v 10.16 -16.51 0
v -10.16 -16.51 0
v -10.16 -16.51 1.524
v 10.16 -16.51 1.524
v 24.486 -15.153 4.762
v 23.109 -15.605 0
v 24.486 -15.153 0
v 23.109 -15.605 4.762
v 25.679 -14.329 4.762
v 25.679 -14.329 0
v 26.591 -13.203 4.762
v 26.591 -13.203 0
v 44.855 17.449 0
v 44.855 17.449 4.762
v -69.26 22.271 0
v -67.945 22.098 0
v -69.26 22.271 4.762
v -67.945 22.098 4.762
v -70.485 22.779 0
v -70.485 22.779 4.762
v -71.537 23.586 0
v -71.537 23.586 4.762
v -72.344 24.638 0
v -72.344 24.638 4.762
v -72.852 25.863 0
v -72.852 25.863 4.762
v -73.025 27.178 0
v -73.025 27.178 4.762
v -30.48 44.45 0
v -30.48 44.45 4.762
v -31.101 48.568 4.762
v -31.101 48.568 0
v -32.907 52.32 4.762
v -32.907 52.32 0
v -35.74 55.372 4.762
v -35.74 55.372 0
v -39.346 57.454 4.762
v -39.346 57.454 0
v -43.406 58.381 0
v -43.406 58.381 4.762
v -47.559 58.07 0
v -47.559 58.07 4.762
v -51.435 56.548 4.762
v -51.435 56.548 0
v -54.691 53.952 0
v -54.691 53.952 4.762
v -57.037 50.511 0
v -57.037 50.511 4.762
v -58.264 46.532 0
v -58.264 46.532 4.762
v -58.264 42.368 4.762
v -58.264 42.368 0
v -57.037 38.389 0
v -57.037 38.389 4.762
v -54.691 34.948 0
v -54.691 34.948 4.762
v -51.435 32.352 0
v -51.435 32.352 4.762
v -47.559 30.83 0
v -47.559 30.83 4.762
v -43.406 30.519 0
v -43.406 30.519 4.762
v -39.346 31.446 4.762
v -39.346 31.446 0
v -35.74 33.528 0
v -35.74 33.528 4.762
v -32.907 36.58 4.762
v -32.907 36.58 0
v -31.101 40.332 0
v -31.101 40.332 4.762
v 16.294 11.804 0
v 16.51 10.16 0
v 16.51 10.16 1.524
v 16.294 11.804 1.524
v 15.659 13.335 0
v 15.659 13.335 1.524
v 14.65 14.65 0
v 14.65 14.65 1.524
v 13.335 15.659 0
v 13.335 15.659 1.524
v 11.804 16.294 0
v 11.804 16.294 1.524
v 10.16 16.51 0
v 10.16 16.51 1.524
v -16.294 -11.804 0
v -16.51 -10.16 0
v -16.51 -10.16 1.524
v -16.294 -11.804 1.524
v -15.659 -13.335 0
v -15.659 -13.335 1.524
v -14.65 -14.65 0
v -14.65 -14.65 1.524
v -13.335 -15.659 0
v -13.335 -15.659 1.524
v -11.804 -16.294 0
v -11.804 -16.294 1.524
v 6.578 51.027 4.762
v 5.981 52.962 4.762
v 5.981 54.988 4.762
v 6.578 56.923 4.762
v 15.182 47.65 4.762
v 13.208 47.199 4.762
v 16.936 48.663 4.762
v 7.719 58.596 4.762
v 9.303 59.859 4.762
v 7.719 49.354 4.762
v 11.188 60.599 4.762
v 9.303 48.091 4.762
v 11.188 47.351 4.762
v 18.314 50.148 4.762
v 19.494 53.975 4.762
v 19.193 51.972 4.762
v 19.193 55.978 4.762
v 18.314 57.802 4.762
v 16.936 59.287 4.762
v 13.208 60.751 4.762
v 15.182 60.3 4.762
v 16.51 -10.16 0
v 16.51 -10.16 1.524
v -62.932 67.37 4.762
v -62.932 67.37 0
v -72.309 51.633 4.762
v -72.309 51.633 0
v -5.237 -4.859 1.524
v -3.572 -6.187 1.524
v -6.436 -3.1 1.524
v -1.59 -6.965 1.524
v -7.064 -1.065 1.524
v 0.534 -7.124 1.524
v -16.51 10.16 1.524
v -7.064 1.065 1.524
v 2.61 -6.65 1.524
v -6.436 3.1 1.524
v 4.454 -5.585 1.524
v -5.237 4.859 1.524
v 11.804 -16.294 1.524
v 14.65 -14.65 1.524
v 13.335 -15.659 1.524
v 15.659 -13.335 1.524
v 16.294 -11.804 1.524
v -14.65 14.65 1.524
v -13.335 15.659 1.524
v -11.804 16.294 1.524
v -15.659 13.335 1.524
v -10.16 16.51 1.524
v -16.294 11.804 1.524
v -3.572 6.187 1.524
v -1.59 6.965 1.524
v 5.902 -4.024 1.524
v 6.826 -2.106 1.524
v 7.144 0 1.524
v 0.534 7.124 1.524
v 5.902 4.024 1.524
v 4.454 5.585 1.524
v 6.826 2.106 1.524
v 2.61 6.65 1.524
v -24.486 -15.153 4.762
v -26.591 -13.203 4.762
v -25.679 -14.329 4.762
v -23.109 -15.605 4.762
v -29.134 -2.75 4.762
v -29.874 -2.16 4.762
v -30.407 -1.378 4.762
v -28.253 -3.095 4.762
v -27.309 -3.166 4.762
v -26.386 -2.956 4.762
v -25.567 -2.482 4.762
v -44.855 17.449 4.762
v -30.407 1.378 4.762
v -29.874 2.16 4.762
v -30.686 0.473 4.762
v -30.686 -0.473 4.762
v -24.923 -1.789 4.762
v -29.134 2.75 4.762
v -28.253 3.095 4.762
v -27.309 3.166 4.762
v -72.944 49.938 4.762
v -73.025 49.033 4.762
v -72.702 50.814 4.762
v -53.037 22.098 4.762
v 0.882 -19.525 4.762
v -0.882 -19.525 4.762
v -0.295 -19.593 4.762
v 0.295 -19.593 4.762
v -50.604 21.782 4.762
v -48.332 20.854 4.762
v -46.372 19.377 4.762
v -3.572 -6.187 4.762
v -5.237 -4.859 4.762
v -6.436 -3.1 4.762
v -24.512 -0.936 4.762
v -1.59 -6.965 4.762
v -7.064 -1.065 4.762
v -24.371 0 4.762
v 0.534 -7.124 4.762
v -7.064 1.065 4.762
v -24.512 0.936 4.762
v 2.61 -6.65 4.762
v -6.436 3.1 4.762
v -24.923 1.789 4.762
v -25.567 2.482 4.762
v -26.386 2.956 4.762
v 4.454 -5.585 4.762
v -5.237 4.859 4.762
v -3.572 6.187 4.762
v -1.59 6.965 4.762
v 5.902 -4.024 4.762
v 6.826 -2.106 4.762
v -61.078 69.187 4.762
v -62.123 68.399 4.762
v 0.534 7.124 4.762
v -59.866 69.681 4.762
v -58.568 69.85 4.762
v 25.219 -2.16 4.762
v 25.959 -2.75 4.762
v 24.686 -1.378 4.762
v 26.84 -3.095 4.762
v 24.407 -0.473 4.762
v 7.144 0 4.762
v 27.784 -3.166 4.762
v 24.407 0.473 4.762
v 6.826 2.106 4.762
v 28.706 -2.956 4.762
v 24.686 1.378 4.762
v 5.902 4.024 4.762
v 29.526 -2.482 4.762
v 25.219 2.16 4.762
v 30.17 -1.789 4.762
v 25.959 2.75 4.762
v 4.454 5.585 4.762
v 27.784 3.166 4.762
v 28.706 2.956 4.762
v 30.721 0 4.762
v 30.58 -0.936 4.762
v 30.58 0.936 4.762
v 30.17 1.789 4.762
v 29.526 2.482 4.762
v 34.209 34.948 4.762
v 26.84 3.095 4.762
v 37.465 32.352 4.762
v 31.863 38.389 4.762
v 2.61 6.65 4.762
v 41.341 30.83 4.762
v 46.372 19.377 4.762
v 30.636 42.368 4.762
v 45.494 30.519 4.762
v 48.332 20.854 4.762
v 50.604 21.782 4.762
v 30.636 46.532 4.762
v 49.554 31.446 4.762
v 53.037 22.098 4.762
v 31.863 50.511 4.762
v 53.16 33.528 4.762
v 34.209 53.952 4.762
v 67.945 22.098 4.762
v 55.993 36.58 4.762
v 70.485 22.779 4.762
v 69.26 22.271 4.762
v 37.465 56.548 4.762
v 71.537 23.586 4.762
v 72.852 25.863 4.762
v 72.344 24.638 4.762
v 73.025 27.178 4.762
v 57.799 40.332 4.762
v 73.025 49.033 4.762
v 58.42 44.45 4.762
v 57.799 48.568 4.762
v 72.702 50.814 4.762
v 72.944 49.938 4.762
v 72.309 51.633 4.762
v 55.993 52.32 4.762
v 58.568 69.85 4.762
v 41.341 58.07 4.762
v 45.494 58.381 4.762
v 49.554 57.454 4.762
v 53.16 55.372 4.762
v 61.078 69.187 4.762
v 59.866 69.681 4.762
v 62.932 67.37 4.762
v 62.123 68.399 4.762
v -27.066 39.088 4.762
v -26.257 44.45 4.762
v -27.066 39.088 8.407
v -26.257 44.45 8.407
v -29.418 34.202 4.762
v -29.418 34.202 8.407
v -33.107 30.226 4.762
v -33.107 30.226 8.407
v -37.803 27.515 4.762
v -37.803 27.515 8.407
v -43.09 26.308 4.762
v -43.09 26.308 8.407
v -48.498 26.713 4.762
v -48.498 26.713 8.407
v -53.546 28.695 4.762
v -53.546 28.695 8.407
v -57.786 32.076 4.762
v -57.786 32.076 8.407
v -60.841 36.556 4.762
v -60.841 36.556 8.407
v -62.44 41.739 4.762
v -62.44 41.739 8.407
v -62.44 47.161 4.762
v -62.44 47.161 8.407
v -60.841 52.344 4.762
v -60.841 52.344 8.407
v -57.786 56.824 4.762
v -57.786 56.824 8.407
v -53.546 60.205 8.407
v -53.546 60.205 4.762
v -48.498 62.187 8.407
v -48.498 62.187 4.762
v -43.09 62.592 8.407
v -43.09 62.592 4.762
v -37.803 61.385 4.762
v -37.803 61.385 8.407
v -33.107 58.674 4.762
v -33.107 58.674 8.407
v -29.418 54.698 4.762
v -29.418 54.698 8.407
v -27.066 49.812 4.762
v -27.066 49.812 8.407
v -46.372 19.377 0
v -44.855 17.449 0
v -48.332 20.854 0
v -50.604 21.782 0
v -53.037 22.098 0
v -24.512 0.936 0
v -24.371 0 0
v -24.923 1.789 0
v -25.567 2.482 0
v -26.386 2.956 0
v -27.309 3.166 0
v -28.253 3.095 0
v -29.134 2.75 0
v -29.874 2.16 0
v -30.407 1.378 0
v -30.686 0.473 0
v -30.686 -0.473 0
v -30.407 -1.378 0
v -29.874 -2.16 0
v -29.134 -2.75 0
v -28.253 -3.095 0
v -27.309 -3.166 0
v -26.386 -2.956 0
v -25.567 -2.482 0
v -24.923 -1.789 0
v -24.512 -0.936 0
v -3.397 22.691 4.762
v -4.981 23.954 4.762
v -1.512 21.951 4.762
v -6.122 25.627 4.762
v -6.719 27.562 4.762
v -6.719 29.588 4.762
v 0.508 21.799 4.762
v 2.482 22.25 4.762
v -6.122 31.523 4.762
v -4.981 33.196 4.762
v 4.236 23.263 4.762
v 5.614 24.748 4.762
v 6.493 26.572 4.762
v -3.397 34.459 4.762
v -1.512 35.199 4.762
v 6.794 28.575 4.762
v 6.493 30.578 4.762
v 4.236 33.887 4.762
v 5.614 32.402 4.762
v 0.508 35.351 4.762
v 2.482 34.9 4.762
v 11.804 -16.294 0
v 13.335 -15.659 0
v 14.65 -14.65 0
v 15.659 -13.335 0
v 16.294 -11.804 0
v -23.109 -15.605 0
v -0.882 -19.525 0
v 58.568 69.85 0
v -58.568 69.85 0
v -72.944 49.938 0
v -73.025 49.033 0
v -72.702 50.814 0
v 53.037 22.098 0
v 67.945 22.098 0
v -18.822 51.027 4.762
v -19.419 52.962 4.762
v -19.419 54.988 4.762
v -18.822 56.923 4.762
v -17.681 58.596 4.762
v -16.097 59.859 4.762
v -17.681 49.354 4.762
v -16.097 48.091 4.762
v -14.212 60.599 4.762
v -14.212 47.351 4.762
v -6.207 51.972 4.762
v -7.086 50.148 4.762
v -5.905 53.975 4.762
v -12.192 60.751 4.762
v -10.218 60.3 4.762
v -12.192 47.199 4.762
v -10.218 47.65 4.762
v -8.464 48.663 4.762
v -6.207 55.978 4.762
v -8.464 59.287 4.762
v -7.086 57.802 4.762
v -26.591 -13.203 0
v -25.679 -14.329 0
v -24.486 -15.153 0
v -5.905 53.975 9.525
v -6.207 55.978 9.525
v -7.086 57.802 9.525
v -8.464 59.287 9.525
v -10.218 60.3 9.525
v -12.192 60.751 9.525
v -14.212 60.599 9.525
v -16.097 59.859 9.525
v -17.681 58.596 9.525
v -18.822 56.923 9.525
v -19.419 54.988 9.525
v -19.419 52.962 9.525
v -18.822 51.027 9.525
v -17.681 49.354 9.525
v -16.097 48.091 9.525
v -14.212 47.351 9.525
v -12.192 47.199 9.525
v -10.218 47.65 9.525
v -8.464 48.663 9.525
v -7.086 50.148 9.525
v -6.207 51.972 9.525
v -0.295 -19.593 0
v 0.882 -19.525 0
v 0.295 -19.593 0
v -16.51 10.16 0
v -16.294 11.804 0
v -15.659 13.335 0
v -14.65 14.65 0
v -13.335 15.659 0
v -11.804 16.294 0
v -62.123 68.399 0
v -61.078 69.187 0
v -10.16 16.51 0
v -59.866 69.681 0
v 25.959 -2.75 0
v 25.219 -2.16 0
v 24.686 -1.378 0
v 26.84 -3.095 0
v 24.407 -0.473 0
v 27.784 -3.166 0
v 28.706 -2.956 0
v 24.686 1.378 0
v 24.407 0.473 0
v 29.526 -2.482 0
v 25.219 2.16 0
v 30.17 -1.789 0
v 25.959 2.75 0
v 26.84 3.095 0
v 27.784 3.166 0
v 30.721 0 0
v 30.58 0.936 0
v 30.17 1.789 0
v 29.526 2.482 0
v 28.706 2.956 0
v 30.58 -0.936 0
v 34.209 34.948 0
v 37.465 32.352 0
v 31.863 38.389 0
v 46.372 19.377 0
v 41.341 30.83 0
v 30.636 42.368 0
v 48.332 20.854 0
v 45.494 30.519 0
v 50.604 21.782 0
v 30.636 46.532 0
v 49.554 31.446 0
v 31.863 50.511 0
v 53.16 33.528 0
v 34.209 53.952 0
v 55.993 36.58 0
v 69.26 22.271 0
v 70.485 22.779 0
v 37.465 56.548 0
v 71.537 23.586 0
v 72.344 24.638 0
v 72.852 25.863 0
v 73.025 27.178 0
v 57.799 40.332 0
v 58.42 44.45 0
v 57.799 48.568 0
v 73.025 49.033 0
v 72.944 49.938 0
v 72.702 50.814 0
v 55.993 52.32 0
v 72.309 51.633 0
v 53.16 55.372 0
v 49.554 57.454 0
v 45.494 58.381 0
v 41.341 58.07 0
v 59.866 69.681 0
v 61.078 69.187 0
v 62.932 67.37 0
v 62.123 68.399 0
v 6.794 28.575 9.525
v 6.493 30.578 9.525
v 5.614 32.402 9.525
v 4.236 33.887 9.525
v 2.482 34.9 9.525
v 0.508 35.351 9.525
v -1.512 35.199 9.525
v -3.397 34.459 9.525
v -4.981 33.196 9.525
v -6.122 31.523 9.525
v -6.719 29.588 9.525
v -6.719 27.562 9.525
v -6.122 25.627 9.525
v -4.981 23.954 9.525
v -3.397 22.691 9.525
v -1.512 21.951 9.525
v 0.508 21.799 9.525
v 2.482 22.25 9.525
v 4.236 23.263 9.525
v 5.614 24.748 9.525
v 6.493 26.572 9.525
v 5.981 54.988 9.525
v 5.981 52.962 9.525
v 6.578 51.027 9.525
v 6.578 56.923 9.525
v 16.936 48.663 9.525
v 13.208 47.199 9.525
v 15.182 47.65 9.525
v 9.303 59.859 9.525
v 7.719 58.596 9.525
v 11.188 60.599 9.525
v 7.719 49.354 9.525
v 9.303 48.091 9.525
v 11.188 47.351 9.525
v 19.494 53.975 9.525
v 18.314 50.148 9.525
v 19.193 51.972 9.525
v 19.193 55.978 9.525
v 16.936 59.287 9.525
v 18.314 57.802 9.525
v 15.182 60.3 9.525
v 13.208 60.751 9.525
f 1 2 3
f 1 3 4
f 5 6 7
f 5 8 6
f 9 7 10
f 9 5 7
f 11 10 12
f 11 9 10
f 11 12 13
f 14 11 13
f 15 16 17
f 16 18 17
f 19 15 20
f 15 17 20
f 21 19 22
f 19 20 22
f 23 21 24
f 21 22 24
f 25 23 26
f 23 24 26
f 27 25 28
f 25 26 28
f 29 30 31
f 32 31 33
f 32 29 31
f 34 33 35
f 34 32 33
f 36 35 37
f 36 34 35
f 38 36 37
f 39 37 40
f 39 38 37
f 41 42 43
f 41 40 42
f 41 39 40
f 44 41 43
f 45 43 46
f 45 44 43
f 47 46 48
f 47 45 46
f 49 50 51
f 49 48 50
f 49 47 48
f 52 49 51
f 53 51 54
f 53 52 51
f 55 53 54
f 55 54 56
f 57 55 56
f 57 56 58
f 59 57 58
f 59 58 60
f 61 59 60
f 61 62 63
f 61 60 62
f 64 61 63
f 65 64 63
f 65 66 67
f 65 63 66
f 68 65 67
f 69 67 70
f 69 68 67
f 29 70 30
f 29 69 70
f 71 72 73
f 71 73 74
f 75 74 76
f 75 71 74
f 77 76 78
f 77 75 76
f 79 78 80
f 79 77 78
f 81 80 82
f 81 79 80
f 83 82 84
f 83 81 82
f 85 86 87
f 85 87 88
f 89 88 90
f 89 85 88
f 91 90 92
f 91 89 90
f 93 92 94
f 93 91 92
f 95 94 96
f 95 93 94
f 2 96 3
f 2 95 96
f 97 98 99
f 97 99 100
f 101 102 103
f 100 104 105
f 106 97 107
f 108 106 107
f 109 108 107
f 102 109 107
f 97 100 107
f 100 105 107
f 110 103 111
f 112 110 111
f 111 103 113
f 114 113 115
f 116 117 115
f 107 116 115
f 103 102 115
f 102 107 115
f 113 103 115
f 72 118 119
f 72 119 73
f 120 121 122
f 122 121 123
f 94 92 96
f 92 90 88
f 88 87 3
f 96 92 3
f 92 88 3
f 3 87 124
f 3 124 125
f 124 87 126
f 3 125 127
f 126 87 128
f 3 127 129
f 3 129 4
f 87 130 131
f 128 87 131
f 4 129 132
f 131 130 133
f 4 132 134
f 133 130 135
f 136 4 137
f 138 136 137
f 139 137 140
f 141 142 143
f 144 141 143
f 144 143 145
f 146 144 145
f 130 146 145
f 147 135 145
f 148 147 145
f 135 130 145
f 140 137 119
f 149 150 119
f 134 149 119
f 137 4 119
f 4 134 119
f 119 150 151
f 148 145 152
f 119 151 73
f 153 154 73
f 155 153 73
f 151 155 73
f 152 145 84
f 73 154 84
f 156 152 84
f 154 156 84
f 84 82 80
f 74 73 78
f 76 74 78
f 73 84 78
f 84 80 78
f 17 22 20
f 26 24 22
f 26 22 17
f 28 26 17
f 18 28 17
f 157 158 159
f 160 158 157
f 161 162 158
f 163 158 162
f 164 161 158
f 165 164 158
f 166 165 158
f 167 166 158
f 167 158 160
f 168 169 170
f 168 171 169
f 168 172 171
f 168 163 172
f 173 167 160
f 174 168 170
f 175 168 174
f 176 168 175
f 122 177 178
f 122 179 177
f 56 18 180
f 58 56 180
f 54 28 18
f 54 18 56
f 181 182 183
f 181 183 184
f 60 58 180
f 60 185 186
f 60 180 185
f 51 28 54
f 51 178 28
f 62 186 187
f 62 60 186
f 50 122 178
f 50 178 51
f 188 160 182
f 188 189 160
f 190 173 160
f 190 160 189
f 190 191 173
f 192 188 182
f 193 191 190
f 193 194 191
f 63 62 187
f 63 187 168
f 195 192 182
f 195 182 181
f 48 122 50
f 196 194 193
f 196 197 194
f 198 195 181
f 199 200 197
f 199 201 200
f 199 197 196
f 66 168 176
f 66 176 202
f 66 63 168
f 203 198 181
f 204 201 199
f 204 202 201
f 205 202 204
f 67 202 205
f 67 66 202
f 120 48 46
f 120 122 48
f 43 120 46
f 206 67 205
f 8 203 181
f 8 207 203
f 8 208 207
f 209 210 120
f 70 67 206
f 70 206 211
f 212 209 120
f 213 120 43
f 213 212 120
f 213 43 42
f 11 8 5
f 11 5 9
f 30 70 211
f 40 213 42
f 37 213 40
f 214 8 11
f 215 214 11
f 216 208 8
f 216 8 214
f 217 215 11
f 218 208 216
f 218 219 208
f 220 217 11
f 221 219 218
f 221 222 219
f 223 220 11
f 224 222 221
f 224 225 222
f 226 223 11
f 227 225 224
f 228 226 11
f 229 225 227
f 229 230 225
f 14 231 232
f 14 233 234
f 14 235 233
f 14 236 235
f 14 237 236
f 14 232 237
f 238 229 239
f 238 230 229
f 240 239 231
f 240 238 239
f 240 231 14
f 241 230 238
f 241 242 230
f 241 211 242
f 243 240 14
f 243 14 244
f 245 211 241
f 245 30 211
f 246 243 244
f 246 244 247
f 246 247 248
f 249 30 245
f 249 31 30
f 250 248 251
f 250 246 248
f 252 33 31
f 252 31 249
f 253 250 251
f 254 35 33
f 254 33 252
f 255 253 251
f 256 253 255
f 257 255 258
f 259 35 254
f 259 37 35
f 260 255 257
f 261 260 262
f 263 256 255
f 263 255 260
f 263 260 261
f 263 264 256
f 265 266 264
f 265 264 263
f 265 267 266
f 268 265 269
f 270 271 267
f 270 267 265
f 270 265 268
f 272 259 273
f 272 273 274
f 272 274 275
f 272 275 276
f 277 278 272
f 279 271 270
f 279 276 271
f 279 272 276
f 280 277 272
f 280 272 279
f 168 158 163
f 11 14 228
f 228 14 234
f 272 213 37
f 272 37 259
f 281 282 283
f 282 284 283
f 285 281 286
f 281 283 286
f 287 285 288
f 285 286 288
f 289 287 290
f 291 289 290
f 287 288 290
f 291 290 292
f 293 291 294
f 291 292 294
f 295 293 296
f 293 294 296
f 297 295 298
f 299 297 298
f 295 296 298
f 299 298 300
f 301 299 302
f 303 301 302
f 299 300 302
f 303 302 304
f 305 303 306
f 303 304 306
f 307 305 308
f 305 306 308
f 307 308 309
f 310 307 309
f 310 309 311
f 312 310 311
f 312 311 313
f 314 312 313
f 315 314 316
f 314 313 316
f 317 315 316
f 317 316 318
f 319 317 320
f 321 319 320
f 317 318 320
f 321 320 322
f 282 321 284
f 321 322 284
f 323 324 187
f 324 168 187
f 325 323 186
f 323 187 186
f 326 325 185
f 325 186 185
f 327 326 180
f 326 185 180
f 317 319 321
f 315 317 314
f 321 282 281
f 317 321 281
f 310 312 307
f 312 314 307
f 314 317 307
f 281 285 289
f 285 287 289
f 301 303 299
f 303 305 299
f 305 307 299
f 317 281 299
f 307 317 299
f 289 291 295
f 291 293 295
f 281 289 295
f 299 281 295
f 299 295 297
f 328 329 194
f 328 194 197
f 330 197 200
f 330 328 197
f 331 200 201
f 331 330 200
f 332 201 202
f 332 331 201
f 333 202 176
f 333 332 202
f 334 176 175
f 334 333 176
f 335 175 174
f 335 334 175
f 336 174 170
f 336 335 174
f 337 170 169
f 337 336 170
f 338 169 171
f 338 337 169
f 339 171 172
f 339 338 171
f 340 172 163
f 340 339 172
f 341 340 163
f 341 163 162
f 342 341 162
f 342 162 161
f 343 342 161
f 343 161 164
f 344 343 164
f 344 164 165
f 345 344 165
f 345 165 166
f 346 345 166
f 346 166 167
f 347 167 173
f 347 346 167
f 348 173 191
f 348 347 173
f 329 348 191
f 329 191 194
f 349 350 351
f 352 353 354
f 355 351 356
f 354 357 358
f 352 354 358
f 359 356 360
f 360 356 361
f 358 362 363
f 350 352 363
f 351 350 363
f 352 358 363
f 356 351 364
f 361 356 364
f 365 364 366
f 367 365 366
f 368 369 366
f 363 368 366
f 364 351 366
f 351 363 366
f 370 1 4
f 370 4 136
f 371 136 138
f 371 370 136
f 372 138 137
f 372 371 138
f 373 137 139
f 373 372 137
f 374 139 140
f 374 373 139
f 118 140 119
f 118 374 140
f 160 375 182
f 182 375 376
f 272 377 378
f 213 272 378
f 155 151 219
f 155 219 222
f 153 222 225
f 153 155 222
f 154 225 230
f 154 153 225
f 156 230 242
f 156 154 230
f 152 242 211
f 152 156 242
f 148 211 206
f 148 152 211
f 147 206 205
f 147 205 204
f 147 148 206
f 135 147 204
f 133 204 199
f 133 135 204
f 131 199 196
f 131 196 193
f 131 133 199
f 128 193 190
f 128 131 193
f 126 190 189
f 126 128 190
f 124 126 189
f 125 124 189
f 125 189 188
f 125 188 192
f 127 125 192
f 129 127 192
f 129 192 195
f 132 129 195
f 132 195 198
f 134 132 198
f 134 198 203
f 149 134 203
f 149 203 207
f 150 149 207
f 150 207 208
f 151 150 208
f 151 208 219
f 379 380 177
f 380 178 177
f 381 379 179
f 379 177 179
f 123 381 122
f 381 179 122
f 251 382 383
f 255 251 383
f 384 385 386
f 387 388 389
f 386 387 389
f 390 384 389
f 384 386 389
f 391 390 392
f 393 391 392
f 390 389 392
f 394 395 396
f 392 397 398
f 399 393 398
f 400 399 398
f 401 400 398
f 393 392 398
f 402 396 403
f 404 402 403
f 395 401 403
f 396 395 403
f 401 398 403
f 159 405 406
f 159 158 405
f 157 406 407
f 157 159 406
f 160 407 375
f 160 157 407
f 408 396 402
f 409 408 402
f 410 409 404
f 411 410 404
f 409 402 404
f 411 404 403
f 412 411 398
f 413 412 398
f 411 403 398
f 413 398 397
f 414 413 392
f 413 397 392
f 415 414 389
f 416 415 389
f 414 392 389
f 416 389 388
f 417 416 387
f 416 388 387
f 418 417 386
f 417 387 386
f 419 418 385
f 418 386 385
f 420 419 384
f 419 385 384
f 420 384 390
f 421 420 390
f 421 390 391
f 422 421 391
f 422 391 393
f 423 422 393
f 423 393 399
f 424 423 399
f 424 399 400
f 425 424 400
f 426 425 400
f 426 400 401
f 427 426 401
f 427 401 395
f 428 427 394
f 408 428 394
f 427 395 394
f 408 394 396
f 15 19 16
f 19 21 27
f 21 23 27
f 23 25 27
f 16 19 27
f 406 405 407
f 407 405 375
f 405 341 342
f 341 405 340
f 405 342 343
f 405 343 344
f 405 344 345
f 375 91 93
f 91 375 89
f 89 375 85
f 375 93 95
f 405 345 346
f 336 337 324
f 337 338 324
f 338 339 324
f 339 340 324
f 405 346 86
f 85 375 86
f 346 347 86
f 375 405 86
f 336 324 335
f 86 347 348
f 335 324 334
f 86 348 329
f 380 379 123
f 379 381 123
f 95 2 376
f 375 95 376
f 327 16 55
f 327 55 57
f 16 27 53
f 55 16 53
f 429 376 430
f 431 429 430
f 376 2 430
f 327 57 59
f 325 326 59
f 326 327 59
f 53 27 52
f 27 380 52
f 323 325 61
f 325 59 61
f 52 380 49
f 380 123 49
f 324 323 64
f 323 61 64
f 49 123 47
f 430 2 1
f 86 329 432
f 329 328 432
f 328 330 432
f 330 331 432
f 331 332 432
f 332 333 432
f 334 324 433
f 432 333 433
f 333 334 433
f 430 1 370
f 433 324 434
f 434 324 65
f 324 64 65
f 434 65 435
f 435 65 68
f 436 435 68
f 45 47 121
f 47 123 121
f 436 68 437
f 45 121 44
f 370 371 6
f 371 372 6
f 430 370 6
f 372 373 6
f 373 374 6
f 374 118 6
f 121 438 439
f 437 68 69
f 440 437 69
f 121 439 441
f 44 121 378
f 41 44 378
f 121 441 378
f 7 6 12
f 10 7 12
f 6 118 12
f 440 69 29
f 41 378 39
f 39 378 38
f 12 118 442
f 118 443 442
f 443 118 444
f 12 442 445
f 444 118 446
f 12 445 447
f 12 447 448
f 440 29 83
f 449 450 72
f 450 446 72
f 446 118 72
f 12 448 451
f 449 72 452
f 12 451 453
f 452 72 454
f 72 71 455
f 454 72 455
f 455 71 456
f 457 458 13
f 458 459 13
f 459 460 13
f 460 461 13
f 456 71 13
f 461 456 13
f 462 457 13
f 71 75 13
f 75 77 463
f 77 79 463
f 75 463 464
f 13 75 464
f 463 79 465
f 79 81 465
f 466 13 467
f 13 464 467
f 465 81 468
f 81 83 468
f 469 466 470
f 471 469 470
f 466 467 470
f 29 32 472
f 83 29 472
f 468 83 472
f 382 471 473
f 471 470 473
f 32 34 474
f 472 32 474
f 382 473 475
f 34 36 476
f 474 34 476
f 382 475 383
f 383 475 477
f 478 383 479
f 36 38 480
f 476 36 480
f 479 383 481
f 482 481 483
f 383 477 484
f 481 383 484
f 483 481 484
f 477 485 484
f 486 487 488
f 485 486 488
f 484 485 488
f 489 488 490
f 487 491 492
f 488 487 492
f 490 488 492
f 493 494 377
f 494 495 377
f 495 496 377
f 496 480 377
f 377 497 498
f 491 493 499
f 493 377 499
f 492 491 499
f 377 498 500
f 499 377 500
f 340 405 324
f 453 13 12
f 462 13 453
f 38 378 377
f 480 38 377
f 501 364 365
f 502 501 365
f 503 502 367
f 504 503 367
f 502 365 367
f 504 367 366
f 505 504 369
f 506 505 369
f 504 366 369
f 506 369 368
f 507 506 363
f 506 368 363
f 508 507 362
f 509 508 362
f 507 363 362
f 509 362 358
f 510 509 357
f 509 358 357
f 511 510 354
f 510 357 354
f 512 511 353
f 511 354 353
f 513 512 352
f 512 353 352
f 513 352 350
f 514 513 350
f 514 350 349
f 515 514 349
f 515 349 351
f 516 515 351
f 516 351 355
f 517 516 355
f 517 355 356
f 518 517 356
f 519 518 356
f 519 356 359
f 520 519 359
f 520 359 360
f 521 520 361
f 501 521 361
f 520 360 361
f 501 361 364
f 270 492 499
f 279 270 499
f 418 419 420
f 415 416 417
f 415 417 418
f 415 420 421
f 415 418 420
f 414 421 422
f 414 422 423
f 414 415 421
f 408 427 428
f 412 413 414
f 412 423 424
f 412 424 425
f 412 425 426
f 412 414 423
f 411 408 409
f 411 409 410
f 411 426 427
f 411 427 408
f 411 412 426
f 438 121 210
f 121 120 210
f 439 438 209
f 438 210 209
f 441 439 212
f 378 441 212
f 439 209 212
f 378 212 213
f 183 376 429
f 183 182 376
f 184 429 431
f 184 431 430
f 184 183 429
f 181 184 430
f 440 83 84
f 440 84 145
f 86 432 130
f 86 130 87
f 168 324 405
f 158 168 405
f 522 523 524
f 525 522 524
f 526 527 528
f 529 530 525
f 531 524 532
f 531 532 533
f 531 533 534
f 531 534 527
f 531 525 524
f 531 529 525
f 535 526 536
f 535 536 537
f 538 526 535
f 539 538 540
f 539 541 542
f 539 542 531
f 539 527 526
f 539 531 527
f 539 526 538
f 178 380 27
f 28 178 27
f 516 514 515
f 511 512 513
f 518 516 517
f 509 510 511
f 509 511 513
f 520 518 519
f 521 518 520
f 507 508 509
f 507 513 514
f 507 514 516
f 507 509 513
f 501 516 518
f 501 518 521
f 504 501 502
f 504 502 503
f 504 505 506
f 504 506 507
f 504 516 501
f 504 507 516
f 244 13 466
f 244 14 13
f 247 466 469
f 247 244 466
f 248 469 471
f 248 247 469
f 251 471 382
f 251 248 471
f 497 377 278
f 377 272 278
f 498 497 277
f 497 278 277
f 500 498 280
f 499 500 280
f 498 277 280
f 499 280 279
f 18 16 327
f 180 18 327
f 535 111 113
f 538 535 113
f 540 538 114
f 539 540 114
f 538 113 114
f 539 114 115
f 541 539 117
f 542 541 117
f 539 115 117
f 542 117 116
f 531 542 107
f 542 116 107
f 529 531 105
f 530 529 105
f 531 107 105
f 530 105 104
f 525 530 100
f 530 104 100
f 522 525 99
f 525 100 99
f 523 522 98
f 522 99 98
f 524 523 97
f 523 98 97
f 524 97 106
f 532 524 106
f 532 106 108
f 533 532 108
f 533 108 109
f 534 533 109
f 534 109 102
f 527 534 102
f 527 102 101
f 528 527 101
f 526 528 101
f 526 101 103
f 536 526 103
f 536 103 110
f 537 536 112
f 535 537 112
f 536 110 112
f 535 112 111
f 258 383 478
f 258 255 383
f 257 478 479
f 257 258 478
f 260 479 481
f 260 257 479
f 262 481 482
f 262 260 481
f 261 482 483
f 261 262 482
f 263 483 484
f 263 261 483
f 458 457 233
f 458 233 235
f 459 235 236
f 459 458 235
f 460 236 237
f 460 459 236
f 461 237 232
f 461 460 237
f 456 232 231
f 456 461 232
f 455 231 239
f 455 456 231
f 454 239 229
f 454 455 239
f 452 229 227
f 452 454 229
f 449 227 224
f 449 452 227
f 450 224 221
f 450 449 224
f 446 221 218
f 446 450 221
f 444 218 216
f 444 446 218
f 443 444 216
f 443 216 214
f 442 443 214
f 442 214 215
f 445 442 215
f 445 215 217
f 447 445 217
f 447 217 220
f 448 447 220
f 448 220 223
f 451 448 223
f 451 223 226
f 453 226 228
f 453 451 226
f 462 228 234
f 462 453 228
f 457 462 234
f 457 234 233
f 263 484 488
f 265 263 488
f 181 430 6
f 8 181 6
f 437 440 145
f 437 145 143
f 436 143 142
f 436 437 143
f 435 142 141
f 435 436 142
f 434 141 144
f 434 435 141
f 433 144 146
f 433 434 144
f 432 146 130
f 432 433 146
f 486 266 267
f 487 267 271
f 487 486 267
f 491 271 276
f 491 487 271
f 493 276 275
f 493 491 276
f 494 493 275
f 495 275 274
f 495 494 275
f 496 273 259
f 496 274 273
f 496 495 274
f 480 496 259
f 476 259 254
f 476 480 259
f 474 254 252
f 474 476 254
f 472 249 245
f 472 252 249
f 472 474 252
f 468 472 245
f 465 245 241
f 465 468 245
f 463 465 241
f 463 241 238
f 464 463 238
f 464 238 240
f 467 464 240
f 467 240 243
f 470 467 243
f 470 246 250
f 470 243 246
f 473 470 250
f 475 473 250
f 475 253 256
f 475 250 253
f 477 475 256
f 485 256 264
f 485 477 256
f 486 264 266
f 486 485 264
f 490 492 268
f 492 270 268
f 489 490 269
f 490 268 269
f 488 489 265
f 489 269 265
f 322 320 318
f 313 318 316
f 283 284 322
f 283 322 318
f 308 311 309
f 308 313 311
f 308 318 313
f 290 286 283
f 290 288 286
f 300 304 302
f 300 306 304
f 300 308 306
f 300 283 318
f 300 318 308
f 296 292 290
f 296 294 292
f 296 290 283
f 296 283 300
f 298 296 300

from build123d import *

# Parameters (mm, degrees)
F0_R      = 3.175
F0_R_2    = 7.14375
F1_DEPTH  = 4.7625
F2_R      = 9.525
F3_R      = 5.08
F4_R      = 13.97
F5_DEPTH  = 25.4
F7_DEPTH  = 1.524
F10_W     = 18.19275
F10_H     = 3.6449
F12_R     = 6.7945
F13_DEPTH = 4.7625


with BuildPart() as f1:
    # F0 (on Top) → F1 (new body)
    with BuildSketch(Plane.XY):
        Polygon((-47.625, 22.098), (-25.4, -15.201417), (0, -19.680122), (25.4, -15.201417), (47.625, 22.098), (73.025, 22.098), (73.025, 50.431723), (61.454545, 69.85), (0, 69.85), (-61.454545, 69.85), (-73.025, 50.431723), (-73.025, 22.098), align=None)
        with Locations((-27.5463, 0)):
            Circle(F0_R, mode=Mode.SUBTRACT)
        Circle(F0_R_2, mode=Mode.SUBTRACT)
        with Locations((27.5463, 0)):
            Circle(F0_R, mode=Mode.SUBTRACT)
    extrude(amount=F1_DEPTH)

    # F2
    f2_edges = [f1.edges().sort_by_distance(p)[0] for p in [
        (-47.625, 22.098, 2.38125),
        (47.625, 22.098, 2.38125),
    ]]
    fillet(f2_edges, radius=F2_R)

    # F3
    f3_edges = [f1.edges().sort_by_distance(p)[0] for p in [
        (-73.025, 22.098, 2.38125),
        (-25.4, -15.201417, 2.38125),
        (0, -19.680122, 2.38125),
        (25.4, -15.201417, 2.38125),
        (73.025, 22.098, 2.38125),
        (73.025, 50.431723, 2.38125),
        (61.454545, 69.85, 2.38125),
        (-73.025, 50.431723, 2.38125),
        (-61.454545, 69.85, 2.38125),
    ]]
    fillet(f3_edges, radius=F3_R)

    # F4 (on Top) → F5 (cut)
    with BuildSketch(Plane.XY):
        with Locations((-44.45, 44.45)):
            Circle(F4_R)
        with Locations((44.45, 44.45)):
            Circle(F4_R)
    extrude(amount=F5_DEPTH, mode=Mode.SUBTRACT)

    # F6 (on Top) → F7 (cut)
    with BuildSketch(Plane.XY):
        with BuildLine():
            Line((-16.51, 10.16), (-16.51, -10.16))
            ThreePointArc((-16.51, -10.16), (-14.650128, -14.650128), (-10.16, -16.51))
            Line((-10.16, -16.51), (10.16, -16.51))
            ThreePointArc((10.16, -16.51), (14.650128, -14.650128), (16.51, -10.16))
            Line((16.51, -10.16), (16.51, 10.16))
            ThreePointArc((16.51, 10.16), (14.650128, 14.650128), (10.16, 16.51))
            Line((10.16, 16.51), (-10.16, 16.51))
            ThreePointArc((-10.16, 16.51), (-14.650128, 14.650128), (-16.51, 10.16))
        make_face()
    extrude(amount=F7_DEPTH, mode=Mode.SUBTRACT)


with BuildPart() as f11:
    # F10 (on offset) → F11 (revolve)
    with BuildSketch(Plane.XZ.offset(-44.45)):
        with Locations((-35.353625, 6.58495)):
            Rectangle(F10_W, F10_H)
    revolve(axis=Axis((-44.45, 44.45, -2.462427), (0, 0, -1)))


with BuildPart() as f13:
    # F12 (on face) → F13 (new body)
    with BuildSketch(Plane.XY.offset(4.7625)):
        with Locations((-12.7, 53.975)):
            Circle(F12_R)
        with Locations((0, 28.575)):
            Circle(F12_R)
        with Locations((12.7, 53.975)):
            Circle(F12_R)
    extrude(amount=F13_DEPTH)


solid = Compound([f1.part, f11.part, f13.part])
